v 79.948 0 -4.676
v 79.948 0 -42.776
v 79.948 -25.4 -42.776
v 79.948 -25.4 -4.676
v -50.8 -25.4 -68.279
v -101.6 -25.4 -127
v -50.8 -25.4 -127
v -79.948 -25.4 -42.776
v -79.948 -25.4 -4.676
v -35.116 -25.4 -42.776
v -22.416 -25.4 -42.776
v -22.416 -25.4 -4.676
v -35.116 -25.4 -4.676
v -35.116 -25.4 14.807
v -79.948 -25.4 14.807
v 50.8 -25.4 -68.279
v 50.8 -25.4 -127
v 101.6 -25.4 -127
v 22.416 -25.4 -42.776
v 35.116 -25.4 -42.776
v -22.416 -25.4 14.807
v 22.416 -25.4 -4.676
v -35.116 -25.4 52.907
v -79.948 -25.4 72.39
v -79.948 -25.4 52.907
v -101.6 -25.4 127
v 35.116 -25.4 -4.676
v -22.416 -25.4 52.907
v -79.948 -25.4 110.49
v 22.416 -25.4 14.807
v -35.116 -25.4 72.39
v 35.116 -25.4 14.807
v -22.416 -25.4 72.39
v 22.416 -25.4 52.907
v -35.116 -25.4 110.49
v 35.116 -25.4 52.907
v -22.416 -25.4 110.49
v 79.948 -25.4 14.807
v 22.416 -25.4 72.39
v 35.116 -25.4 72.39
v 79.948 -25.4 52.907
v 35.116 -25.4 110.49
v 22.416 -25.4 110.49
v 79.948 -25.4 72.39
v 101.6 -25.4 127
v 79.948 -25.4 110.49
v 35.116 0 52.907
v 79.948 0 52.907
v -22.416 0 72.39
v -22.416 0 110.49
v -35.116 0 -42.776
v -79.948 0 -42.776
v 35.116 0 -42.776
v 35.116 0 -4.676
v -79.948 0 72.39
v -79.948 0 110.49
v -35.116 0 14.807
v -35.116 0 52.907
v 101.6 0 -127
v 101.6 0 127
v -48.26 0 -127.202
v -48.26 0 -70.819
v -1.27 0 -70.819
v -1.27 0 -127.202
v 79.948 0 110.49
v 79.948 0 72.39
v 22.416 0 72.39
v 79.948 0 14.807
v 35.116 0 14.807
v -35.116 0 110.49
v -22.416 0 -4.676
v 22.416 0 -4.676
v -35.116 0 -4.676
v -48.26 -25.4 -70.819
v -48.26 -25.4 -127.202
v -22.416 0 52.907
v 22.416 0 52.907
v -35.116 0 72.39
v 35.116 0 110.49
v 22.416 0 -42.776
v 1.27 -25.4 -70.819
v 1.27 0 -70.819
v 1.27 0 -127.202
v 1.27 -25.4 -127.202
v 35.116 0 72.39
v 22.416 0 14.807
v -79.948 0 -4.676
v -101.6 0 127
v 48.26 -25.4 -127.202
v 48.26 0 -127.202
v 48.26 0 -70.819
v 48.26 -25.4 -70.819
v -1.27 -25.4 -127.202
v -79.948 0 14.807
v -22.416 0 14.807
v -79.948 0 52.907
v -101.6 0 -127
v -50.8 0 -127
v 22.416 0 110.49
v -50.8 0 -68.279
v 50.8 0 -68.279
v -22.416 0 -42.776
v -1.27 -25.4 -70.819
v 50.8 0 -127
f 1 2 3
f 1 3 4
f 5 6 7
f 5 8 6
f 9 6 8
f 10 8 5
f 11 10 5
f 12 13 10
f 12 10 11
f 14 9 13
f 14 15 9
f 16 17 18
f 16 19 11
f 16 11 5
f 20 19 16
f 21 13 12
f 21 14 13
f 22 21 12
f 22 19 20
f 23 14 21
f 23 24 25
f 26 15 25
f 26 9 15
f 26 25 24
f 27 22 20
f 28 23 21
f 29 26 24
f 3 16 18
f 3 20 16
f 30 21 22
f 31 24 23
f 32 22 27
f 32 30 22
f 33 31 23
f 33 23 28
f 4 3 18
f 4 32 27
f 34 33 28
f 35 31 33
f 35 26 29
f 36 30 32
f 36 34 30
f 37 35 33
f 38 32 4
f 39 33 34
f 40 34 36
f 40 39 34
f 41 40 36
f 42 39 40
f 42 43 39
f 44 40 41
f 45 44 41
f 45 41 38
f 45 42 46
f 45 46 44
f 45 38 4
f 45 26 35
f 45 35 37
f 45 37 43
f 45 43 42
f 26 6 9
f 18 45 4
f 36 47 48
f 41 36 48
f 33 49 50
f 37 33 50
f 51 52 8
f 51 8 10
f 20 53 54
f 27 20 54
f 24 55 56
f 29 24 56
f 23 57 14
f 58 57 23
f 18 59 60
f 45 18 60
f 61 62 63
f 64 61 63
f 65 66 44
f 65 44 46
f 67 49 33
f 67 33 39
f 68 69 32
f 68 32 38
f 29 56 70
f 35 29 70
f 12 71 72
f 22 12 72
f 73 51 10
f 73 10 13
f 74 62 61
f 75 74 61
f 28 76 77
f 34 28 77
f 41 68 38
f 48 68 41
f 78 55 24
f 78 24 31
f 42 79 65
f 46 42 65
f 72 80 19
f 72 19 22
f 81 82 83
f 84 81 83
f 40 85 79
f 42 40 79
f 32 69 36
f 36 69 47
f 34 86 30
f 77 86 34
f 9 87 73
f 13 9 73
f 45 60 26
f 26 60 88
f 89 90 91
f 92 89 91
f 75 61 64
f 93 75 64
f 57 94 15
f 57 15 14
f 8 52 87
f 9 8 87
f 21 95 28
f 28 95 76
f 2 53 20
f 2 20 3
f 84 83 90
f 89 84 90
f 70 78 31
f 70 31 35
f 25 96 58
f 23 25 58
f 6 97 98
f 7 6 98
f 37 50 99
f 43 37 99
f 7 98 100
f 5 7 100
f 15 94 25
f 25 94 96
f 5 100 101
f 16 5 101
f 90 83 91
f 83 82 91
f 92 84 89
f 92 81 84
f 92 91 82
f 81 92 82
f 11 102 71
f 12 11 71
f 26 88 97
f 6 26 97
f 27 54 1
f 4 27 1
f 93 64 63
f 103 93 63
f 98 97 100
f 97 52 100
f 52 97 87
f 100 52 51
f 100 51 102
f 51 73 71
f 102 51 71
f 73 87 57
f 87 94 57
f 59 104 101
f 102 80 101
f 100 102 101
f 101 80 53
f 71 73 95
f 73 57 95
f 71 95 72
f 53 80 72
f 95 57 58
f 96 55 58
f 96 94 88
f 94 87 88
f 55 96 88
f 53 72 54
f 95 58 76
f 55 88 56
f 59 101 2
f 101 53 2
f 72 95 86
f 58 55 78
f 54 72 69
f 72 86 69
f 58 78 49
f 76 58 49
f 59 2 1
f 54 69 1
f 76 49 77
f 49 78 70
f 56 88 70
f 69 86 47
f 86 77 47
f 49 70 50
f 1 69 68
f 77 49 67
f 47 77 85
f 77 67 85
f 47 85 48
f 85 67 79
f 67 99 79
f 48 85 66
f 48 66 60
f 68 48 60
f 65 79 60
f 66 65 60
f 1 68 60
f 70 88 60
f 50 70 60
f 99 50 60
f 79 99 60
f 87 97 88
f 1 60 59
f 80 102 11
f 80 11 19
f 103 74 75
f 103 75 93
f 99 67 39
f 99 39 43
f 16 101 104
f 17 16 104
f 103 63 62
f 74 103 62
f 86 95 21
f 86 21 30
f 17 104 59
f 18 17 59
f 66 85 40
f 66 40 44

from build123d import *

# Parameters (mm, degrees)
F0_W     = 44.8322
F0_H     = 38.1
F1_DEPTH = 25.4


with BuildPart() as f1:
    # F0 (on Front) → F1 (new body)
    with BuildSketch(Plane.XZ):
        Polygon((101.6, 127), (-101.6, 127), (-101.6, -127), (-50.8, -127), (-50.8, -68.278951), (50.8, -68.278951), (50.8, -127), (101.6, -127), align=None)
        with Locations((-57.5322, -23.72646)):
            Rectangle(F0_W, F0_H, mode=Mode.SUBTRACT)
        with Locations((0, -23.72646)):
            Rectangle(F0_W, F0_H, mode=Mode.SUBTRACT)
        with Locations((57.5322, -23.72646)):
            Rectangle(F0_W, F0_H, mode=Mode.SUBTRACT)
        with Locations((-57.5322, 33.85677)):
            Rectangle(F0_W, F0_H, mode=Mode.SUBTRACT)
        with Locations((0, 33.85677)):
            Rectangle(F0_W, F0_H, mode=Mode.SUBTRACT)
        with Locations((-57.5322, 91.44)):
            Rectangle(F0_W, F0_H, mode=Mode.SUBTRACT)
        with Locations((0, 91.44)):
            Rectangle(F0_W, F0_H, mode=Mode.SUBTRACT)
        with Locations((57.5322, 33.85677)):
            Rectangle(F0_W, F0_H, mode=Mode.SUBTRACT)
        with Locations((57.5322, 91.44)):
            Rectangle(F0_W, F0_H, mode=Mode.SUBTRACT)
        Polygon((-48.26, -70.818951), (-48.26, -127.202397), (-1.27, -127.202397), (-1.27, -127), (-1.27, -70.818951), align=None)
        Polygon((1.27, -127.202397), (48.26, -127.202397), (48.26, -70.818951), (1.27, -70.818951), (1.27, -127), align=None)
    extrude(amount=F1_DEPTH)


solid = f1.part
